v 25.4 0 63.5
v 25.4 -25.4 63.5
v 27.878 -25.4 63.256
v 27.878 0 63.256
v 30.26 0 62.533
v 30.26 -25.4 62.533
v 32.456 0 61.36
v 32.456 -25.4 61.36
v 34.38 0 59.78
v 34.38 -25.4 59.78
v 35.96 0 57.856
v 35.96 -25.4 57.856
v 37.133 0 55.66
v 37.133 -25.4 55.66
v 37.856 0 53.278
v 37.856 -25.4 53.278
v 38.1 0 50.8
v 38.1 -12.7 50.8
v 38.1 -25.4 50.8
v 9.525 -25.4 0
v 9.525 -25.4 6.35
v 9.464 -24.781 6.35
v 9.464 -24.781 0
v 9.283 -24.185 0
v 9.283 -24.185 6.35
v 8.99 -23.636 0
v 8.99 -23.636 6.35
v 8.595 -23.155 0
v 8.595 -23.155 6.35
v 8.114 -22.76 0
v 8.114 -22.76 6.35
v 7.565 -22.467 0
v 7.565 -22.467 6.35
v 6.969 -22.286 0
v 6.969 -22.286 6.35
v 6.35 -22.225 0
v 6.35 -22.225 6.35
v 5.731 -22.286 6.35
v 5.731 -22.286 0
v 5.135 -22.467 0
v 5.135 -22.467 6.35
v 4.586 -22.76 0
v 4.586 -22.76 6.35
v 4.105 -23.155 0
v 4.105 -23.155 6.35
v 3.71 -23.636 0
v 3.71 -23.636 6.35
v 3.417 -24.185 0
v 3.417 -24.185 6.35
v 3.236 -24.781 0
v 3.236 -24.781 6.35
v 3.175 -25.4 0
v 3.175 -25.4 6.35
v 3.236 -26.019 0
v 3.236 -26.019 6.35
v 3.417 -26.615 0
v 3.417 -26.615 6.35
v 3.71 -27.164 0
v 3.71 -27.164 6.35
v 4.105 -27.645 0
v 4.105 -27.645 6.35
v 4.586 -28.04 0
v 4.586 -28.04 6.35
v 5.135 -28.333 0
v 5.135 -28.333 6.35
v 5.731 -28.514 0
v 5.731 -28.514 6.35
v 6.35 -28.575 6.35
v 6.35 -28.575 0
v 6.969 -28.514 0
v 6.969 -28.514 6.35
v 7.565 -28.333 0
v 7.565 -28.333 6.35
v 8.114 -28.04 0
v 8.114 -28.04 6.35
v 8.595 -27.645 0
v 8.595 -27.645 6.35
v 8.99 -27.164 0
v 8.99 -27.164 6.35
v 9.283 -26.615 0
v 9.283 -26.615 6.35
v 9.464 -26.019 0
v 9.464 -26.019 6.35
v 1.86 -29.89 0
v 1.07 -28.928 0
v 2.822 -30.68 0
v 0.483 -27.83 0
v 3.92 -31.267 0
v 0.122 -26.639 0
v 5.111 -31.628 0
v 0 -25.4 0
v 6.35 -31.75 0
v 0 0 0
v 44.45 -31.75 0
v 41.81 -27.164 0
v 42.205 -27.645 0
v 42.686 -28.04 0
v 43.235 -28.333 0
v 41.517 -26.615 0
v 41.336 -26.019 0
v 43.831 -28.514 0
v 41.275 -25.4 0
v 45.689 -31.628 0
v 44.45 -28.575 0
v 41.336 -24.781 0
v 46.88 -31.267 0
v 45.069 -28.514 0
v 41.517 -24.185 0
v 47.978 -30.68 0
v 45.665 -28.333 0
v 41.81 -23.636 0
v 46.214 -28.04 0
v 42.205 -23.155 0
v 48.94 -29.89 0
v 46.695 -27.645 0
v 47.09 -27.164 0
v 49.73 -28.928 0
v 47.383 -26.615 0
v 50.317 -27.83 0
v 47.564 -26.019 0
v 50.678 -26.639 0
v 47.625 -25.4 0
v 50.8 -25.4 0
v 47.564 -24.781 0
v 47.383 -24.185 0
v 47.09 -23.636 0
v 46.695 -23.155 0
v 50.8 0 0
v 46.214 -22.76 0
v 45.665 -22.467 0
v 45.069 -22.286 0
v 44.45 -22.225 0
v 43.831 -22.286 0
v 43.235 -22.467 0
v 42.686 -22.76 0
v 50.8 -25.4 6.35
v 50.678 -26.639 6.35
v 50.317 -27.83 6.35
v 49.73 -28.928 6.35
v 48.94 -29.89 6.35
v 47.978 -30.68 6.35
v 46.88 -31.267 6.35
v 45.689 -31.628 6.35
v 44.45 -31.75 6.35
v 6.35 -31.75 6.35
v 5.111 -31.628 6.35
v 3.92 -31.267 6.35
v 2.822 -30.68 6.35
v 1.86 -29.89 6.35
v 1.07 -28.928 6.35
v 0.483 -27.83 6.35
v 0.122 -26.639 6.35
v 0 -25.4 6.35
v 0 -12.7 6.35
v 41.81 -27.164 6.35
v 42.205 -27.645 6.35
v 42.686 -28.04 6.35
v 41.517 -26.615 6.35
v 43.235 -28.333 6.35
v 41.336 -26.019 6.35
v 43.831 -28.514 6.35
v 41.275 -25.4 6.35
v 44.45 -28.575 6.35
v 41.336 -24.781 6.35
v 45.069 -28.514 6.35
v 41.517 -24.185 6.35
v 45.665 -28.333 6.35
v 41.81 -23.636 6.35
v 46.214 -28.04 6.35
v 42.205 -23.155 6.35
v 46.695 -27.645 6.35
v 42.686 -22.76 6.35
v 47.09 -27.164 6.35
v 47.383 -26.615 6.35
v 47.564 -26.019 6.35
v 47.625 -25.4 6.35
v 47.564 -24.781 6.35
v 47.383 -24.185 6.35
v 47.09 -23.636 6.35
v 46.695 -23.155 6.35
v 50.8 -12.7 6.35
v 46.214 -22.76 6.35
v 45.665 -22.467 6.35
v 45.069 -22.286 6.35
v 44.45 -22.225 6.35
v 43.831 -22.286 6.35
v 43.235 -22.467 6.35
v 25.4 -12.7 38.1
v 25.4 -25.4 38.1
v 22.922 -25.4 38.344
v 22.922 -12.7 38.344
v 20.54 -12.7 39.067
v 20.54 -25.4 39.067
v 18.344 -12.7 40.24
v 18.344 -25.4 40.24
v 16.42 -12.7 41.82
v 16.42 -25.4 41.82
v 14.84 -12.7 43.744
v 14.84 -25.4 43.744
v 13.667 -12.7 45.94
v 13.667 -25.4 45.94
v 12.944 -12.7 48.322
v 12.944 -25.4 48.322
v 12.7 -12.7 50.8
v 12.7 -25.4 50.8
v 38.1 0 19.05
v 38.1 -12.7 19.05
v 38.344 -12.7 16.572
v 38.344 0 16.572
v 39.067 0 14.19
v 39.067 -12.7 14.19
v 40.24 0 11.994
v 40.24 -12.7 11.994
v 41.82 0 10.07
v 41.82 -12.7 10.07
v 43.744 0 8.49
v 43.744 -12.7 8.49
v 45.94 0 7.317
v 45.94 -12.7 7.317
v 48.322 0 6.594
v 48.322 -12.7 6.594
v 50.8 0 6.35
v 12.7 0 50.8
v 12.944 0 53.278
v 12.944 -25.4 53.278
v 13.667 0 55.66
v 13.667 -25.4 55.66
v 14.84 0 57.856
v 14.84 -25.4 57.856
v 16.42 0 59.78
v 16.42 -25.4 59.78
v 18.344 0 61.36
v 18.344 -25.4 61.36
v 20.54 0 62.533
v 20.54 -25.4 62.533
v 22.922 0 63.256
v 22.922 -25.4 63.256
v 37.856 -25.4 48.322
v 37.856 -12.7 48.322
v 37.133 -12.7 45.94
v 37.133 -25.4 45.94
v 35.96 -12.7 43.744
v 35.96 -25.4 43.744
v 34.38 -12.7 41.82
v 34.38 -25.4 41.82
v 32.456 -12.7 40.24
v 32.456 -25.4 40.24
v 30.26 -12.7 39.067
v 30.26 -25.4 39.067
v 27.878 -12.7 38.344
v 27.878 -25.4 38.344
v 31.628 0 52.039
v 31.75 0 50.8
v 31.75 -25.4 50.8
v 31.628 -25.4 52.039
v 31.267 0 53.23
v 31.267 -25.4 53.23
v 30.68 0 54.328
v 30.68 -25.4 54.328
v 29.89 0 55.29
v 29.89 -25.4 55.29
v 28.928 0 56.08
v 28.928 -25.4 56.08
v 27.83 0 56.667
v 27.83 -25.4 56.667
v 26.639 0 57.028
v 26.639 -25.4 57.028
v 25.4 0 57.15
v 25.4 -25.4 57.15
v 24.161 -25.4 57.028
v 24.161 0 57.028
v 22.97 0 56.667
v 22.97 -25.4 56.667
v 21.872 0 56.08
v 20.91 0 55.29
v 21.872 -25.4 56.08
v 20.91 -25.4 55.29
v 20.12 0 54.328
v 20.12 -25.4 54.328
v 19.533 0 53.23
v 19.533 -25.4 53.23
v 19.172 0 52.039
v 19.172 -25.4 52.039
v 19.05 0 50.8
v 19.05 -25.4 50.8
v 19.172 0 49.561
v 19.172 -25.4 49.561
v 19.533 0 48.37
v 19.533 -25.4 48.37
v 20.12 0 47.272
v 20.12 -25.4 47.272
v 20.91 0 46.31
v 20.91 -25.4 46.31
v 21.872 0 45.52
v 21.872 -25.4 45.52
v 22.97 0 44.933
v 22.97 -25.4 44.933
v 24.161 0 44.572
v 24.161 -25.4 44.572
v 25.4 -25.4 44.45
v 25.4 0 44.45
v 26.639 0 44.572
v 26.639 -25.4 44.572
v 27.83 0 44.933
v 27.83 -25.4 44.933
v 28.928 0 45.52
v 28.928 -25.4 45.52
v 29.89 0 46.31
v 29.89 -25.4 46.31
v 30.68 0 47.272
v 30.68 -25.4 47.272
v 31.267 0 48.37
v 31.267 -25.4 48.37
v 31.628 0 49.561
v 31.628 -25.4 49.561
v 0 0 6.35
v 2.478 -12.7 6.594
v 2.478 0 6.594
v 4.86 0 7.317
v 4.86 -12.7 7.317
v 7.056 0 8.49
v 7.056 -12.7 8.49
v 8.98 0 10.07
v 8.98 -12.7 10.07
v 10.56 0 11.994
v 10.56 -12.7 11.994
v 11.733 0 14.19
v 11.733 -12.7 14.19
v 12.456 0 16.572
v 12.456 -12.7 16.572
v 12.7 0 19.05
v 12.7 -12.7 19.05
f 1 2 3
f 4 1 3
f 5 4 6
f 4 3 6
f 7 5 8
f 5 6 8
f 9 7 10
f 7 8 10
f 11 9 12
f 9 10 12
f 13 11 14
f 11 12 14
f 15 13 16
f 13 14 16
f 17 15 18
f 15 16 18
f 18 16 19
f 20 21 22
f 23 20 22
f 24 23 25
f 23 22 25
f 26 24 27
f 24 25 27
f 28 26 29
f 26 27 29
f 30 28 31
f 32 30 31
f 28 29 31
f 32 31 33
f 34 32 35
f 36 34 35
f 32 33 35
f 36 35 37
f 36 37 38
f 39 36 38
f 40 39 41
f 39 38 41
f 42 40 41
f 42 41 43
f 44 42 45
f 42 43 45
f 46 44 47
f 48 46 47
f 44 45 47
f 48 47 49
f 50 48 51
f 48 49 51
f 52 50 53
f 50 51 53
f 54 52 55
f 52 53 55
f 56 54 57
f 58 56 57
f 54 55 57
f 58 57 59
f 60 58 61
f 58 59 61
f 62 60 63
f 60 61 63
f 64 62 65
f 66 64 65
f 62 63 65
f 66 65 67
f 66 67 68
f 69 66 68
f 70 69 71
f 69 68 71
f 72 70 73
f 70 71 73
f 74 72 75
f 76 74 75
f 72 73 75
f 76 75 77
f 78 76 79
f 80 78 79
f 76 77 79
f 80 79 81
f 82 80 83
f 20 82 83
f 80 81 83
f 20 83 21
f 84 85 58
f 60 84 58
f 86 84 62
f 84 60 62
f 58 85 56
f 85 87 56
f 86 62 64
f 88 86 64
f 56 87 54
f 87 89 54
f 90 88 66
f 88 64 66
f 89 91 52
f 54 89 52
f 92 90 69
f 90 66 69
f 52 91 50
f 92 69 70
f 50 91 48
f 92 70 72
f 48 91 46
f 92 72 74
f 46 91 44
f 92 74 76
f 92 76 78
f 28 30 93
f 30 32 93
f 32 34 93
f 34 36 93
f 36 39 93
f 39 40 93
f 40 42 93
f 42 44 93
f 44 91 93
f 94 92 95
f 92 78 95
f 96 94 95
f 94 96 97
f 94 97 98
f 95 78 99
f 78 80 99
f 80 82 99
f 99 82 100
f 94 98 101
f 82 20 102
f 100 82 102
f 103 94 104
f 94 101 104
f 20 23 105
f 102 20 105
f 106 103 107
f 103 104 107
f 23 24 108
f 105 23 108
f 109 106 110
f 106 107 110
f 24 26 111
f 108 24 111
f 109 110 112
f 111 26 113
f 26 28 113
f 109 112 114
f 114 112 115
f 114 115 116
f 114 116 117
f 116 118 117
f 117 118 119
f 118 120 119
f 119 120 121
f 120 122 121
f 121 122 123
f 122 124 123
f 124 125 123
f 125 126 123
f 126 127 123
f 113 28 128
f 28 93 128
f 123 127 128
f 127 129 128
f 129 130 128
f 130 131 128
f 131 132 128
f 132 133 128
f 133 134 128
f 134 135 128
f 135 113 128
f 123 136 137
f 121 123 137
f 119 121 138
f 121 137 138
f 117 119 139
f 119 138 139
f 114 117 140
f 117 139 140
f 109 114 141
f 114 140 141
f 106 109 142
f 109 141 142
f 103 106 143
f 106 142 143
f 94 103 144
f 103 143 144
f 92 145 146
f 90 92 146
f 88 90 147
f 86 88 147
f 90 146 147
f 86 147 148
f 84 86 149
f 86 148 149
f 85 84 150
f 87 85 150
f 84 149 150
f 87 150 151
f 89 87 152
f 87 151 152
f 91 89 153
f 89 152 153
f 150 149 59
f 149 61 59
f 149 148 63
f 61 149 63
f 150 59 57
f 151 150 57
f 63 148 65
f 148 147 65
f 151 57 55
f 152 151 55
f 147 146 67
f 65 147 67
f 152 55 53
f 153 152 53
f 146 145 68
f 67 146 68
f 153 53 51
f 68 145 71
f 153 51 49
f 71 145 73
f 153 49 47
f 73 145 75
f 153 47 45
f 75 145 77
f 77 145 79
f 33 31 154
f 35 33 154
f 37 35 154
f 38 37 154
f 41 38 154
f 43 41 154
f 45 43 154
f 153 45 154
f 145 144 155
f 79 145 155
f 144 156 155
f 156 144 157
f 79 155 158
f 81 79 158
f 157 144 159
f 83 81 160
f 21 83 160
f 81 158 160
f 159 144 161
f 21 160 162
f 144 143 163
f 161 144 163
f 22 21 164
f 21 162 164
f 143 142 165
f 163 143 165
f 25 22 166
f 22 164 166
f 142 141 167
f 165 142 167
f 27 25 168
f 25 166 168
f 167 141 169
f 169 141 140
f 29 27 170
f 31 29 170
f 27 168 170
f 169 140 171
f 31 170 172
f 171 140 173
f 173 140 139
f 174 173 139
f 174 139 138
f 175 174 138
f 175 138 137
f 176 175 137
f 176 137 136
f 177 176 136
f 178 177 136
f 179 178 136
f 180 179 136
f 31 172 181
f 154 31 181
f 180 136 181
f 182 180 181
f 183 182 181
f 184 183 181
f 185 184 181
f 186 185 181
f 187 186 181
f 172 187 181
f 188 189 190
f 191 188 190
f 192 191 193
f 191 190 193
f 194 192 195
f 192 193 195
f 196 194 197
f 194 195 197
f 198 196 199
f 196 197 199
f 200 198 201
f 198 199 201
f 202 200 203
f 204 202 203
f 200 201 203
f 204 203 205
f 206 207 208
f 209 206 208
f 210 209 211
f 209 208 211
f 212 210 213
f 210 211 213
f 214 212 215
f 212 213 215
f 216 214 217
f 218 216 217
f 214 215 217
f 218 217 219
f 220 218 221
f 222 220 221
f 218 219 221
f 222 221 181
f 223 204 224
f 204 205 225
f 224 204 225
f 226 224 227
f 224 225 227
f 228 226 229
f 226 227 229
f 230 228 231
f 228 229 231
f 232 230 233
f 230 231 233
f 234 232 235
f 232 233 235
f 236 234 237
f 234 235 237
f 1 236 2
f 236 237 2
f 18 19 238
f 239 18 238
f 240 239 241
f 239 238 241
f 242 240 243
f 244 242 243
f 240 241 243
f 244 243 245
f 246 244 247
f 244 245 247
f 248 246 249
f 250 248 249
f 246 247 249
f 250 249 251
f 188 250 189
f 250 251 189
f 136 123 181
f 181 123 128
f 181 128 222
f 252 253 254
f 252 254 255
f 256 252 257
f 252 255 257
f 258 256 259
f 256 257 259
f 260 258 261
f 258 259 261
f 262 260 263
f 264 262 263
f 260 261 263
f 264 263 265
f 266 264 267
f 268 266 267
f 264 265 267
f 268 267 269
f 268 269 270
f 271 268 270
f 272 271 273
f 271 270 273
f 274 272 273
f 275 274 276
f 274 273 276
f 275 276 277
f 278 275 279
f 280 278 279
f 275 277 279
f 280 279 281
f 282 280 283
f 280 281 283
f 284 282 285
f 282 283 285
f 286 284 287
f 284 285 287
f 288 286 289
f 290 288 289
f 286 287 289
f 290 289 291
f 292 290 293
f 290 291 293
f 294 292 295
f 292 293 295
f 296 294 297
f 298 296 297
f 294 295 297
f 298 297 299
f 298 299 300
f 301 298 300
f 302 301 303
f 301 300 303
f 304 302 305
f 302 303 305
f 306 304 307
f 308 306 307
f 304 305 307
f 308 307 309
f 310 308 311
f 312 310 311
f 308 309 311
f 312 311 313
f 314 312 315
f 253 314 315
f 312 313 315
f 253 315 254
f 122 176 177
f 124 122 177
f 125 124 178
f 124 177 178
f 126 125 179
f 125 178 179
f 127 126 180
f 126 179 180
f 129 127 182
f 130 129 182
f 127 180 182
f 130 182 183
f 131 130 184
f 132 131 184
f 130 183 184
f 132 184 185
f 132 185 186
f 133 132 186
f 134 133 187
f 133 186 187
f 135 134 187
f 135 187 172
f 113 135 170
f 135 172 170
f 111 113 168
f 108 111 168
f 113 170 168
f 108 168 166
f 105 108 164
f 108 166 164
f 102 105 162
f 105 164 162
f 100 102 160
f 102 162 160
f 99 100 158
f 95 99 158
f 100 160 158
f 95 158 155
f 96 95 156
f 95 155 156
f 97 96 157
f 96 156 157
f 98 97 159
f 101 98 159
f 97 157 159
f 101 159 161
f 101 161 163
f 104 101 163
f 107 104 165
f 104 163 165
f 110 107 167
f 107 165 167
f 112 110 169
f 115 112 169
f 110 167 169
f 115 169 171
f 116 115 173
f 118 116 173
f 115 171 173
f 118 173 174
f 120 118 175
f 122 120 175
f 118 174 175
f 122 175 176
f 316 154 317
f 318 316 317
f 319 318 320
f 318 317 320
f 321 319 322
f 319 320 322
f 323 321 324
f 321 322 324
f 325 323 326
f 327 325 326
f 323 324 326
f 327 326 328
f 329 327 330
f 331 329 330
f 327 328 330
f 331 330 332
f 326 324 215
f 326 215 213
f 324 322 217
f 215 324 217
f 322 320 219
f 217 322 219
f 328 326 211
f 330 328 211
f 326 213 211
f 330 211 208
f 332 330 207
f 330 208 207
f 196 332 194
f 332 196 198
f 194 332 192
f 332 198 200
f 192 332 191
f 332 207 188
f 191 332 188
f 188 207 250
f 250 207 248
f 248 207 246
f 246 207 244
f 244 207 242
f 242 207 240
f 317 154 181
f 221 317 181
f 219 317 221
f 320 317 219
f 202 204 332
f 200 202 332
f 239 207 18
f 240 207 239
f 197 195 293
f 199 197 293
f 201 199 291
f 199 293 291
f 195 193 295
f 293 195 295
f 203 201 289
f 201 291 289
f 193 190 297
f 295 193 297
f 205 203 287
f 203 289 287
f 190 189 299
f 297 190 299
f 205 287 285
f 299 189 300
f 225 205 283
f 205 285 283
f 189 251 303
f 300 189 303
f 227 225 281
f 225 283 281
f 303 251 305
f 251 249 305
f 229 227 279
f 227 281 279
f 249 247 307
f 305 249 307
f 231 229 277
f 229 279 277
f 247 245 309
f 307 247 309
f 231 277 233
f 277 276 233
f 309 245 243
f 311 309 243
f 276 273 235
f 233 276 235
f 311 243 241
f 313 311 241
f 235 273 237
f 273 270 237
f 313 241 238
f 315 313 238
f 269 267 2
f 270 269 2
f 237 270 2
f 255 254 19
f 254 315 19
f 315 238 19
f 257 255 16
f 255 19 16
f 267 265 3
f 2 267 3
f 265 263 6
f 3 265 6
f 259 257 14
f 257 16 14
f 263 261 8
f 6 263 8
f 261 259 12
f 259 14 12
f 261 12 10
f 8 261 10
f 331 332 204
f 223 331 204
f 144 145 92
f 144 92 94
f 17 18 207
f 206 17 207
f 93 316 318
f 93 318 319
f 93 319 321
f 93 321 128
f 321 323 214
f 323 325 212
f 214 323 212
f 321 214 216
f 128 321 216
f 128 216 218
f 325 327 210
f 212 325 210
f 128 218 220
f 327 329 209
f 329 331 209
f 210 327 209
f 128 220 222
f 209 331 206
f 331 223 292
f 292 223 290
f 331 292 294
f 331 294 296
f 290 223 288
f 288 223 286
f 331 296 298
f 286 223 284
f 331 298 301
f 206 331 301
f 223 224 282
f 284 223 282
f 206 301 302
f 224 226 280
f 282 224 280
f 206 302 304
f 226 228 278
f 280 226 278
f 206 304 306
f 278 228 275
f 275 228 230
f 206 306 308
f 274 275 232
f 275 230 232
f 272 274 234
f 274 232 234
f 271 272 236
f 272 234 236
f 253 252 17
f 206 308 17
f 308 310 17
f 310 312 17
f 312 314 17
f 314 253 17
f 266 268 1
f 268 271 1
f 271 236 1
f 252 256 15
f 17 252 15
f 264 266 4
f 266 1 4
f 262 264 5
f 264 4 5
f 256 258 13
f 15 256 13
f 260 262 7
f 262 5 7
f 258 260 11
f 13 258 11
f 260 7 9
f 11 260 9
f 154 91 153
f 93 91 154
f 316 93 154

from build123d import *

# Parameters (mm, degrees)
F0_W      = 50.8
F0_H      = 63.5
F1_DEPTH  = 31.75
F3_DEPTH  = 50.8
F5_DEPTH  = 12.7
F7_DEPTH  = 12.7
F6_R      = 6.35
F8_DEPTH  = 25.4
F9_R      = 3.175
F10_DEPTH = 6.35


with BuildPart() as f1:
    # F0 (on Front) → F1 (new body)
    with BuildSketch(Plane.XZ):
        with Locations((25.4, 31.75)):
            Rectangle(F0_W, F0_H)
    extrude(amount=F1_DEPTH)

    # F2 (on face) → F3 (cut)
    with BuildSketch(Plane.YZ.offset(50.8)):
        Polygon((-31.75, 63.5), (-31.75, 6.35), (-12.7, 6.35), (-12.7, 38.1), (-25.4, 38.1), (-25.4, 63.5), align=None)
    extrude(amount=-F3_DEPTH, mode=Mode.SUBTRACT)

    # F4 (on face) → F5 (cut)
    with BuildSketch(Plane.XZ.offset(12.7)):
        with BuildLine():
            Line((12.7, 19.05), (12.7, 38.1))
            Line((12.7, 38.1), (0, 38.1))
            Line((0, 38.1), (0, 6.35))
            ThreePointArc((0, 6.35), (8.9802561211, 10.0697438789), (12.7, 19.05))
        make_face()
        with BuildLine():
            Line((50.8, 6.35), (50.8, 38.1))
            Line((50.8, 38.1), (38.1, 38.1))
            Line((38.1, 38.1), (38.1, 19.05))
            ThreePointArc((38.1, 19.05), (41.8197438789, 10.0697438789), (50.8, 6.35))
        make_face()
    extrude(amount=-F5_DEPTH, mode=Mode.SUBTRACT)

    # F6 (on face) → F7 (cut)
    with BuildSketch(Plane.XZ.offset(25.4)):
        with BuildLine():
            ThreePointArc((38.1, 50.8), (34.3802561211, 41.8197438789), (25.4, 38.1))
            Line((25.4, 38.1), (38.1, 38.1))
            Line((38.1, 38.1), (38.1, 50.8))
        make_face()
        with BuildLine():
            Line((12.7, 50.8), (12.7, 38.1))
            Line((12.7, 38.1), (25.4, 38.1))
            ThreePointArc((25.4, 38.1), (16.4197438789, 41.8197438789), (12.7, 50.8))
        make_face()
    extrude(amount=-F7_DEPTH, mode=Mode.SUBTRACT)

    # F6 (on face) → F8 (cut)
    with BuildSketch(Plane.XZ.offset(25.4)):
        with Locations((25.4, 50.8)):
            Circle(F6_R)
        Polygon((0, 63.5), (0, 38.1), (12.7, 38.1), (12.7, 50.8), (12.7, 63.5), align=None)
        Polygon((38.1, 63.5), (38.1, 50.8), (38.1, 38.1), (50.8, 38.1), (50.8, 63.5), align=None)
        with BuildLine():
            Line((38.1, 63.5), (25.4, 63.5))
            ThreePointArc((25.4, 63.5), (34.3802561211, 59.7802561211), (38.1, 50.8))
            Line((38.1, 50.8), (38.1, 63.5))
        make_face()
        with BuildLine():
            Line((12.7, 63.5), (12.7, 50.8))
            ThreePointArc((12.7, 50.8), (16.4197438789, 59.7802561211), (25.4, 63.5))
            Line((25.4, 63.5), (12.7, 63.5))
        make_face()
    extrude(amount=-F8_DEPTH, mode=Mode.SUBTRACT)

    # F9 (on face) → F10 (cut)
    with BuildSketch(Plane.XY.offset(6.35)):
        with Locations((6.35, -25.4)):
            Circle(F9_R)
        with Locations((44.45, -25.4)):
            Circle(F9_R)
        with BuildLine():
            ThreePointArc((6.35, -31.75), (1.8598719395, -29.8901280605), (0, -25.4))
            Line((0, -25.4), (0, -31.75))
            Line((0, -31.75), (6.35, -31.75))
        make_face()
        with BuildLine():
            ThreePointArc((50.8, -25.4), (48.9401280605, -29.8901280605), (44.45, -31.75))
            Line((44.45, -31.75), (50.8, -31.75))
            Line((50.8, -31.75), (50.8, -25.4))
        make_face()
    extrude(amount=-F10_DEPTH, mode=Mode.SUBTRACT)


solid = f1.part
